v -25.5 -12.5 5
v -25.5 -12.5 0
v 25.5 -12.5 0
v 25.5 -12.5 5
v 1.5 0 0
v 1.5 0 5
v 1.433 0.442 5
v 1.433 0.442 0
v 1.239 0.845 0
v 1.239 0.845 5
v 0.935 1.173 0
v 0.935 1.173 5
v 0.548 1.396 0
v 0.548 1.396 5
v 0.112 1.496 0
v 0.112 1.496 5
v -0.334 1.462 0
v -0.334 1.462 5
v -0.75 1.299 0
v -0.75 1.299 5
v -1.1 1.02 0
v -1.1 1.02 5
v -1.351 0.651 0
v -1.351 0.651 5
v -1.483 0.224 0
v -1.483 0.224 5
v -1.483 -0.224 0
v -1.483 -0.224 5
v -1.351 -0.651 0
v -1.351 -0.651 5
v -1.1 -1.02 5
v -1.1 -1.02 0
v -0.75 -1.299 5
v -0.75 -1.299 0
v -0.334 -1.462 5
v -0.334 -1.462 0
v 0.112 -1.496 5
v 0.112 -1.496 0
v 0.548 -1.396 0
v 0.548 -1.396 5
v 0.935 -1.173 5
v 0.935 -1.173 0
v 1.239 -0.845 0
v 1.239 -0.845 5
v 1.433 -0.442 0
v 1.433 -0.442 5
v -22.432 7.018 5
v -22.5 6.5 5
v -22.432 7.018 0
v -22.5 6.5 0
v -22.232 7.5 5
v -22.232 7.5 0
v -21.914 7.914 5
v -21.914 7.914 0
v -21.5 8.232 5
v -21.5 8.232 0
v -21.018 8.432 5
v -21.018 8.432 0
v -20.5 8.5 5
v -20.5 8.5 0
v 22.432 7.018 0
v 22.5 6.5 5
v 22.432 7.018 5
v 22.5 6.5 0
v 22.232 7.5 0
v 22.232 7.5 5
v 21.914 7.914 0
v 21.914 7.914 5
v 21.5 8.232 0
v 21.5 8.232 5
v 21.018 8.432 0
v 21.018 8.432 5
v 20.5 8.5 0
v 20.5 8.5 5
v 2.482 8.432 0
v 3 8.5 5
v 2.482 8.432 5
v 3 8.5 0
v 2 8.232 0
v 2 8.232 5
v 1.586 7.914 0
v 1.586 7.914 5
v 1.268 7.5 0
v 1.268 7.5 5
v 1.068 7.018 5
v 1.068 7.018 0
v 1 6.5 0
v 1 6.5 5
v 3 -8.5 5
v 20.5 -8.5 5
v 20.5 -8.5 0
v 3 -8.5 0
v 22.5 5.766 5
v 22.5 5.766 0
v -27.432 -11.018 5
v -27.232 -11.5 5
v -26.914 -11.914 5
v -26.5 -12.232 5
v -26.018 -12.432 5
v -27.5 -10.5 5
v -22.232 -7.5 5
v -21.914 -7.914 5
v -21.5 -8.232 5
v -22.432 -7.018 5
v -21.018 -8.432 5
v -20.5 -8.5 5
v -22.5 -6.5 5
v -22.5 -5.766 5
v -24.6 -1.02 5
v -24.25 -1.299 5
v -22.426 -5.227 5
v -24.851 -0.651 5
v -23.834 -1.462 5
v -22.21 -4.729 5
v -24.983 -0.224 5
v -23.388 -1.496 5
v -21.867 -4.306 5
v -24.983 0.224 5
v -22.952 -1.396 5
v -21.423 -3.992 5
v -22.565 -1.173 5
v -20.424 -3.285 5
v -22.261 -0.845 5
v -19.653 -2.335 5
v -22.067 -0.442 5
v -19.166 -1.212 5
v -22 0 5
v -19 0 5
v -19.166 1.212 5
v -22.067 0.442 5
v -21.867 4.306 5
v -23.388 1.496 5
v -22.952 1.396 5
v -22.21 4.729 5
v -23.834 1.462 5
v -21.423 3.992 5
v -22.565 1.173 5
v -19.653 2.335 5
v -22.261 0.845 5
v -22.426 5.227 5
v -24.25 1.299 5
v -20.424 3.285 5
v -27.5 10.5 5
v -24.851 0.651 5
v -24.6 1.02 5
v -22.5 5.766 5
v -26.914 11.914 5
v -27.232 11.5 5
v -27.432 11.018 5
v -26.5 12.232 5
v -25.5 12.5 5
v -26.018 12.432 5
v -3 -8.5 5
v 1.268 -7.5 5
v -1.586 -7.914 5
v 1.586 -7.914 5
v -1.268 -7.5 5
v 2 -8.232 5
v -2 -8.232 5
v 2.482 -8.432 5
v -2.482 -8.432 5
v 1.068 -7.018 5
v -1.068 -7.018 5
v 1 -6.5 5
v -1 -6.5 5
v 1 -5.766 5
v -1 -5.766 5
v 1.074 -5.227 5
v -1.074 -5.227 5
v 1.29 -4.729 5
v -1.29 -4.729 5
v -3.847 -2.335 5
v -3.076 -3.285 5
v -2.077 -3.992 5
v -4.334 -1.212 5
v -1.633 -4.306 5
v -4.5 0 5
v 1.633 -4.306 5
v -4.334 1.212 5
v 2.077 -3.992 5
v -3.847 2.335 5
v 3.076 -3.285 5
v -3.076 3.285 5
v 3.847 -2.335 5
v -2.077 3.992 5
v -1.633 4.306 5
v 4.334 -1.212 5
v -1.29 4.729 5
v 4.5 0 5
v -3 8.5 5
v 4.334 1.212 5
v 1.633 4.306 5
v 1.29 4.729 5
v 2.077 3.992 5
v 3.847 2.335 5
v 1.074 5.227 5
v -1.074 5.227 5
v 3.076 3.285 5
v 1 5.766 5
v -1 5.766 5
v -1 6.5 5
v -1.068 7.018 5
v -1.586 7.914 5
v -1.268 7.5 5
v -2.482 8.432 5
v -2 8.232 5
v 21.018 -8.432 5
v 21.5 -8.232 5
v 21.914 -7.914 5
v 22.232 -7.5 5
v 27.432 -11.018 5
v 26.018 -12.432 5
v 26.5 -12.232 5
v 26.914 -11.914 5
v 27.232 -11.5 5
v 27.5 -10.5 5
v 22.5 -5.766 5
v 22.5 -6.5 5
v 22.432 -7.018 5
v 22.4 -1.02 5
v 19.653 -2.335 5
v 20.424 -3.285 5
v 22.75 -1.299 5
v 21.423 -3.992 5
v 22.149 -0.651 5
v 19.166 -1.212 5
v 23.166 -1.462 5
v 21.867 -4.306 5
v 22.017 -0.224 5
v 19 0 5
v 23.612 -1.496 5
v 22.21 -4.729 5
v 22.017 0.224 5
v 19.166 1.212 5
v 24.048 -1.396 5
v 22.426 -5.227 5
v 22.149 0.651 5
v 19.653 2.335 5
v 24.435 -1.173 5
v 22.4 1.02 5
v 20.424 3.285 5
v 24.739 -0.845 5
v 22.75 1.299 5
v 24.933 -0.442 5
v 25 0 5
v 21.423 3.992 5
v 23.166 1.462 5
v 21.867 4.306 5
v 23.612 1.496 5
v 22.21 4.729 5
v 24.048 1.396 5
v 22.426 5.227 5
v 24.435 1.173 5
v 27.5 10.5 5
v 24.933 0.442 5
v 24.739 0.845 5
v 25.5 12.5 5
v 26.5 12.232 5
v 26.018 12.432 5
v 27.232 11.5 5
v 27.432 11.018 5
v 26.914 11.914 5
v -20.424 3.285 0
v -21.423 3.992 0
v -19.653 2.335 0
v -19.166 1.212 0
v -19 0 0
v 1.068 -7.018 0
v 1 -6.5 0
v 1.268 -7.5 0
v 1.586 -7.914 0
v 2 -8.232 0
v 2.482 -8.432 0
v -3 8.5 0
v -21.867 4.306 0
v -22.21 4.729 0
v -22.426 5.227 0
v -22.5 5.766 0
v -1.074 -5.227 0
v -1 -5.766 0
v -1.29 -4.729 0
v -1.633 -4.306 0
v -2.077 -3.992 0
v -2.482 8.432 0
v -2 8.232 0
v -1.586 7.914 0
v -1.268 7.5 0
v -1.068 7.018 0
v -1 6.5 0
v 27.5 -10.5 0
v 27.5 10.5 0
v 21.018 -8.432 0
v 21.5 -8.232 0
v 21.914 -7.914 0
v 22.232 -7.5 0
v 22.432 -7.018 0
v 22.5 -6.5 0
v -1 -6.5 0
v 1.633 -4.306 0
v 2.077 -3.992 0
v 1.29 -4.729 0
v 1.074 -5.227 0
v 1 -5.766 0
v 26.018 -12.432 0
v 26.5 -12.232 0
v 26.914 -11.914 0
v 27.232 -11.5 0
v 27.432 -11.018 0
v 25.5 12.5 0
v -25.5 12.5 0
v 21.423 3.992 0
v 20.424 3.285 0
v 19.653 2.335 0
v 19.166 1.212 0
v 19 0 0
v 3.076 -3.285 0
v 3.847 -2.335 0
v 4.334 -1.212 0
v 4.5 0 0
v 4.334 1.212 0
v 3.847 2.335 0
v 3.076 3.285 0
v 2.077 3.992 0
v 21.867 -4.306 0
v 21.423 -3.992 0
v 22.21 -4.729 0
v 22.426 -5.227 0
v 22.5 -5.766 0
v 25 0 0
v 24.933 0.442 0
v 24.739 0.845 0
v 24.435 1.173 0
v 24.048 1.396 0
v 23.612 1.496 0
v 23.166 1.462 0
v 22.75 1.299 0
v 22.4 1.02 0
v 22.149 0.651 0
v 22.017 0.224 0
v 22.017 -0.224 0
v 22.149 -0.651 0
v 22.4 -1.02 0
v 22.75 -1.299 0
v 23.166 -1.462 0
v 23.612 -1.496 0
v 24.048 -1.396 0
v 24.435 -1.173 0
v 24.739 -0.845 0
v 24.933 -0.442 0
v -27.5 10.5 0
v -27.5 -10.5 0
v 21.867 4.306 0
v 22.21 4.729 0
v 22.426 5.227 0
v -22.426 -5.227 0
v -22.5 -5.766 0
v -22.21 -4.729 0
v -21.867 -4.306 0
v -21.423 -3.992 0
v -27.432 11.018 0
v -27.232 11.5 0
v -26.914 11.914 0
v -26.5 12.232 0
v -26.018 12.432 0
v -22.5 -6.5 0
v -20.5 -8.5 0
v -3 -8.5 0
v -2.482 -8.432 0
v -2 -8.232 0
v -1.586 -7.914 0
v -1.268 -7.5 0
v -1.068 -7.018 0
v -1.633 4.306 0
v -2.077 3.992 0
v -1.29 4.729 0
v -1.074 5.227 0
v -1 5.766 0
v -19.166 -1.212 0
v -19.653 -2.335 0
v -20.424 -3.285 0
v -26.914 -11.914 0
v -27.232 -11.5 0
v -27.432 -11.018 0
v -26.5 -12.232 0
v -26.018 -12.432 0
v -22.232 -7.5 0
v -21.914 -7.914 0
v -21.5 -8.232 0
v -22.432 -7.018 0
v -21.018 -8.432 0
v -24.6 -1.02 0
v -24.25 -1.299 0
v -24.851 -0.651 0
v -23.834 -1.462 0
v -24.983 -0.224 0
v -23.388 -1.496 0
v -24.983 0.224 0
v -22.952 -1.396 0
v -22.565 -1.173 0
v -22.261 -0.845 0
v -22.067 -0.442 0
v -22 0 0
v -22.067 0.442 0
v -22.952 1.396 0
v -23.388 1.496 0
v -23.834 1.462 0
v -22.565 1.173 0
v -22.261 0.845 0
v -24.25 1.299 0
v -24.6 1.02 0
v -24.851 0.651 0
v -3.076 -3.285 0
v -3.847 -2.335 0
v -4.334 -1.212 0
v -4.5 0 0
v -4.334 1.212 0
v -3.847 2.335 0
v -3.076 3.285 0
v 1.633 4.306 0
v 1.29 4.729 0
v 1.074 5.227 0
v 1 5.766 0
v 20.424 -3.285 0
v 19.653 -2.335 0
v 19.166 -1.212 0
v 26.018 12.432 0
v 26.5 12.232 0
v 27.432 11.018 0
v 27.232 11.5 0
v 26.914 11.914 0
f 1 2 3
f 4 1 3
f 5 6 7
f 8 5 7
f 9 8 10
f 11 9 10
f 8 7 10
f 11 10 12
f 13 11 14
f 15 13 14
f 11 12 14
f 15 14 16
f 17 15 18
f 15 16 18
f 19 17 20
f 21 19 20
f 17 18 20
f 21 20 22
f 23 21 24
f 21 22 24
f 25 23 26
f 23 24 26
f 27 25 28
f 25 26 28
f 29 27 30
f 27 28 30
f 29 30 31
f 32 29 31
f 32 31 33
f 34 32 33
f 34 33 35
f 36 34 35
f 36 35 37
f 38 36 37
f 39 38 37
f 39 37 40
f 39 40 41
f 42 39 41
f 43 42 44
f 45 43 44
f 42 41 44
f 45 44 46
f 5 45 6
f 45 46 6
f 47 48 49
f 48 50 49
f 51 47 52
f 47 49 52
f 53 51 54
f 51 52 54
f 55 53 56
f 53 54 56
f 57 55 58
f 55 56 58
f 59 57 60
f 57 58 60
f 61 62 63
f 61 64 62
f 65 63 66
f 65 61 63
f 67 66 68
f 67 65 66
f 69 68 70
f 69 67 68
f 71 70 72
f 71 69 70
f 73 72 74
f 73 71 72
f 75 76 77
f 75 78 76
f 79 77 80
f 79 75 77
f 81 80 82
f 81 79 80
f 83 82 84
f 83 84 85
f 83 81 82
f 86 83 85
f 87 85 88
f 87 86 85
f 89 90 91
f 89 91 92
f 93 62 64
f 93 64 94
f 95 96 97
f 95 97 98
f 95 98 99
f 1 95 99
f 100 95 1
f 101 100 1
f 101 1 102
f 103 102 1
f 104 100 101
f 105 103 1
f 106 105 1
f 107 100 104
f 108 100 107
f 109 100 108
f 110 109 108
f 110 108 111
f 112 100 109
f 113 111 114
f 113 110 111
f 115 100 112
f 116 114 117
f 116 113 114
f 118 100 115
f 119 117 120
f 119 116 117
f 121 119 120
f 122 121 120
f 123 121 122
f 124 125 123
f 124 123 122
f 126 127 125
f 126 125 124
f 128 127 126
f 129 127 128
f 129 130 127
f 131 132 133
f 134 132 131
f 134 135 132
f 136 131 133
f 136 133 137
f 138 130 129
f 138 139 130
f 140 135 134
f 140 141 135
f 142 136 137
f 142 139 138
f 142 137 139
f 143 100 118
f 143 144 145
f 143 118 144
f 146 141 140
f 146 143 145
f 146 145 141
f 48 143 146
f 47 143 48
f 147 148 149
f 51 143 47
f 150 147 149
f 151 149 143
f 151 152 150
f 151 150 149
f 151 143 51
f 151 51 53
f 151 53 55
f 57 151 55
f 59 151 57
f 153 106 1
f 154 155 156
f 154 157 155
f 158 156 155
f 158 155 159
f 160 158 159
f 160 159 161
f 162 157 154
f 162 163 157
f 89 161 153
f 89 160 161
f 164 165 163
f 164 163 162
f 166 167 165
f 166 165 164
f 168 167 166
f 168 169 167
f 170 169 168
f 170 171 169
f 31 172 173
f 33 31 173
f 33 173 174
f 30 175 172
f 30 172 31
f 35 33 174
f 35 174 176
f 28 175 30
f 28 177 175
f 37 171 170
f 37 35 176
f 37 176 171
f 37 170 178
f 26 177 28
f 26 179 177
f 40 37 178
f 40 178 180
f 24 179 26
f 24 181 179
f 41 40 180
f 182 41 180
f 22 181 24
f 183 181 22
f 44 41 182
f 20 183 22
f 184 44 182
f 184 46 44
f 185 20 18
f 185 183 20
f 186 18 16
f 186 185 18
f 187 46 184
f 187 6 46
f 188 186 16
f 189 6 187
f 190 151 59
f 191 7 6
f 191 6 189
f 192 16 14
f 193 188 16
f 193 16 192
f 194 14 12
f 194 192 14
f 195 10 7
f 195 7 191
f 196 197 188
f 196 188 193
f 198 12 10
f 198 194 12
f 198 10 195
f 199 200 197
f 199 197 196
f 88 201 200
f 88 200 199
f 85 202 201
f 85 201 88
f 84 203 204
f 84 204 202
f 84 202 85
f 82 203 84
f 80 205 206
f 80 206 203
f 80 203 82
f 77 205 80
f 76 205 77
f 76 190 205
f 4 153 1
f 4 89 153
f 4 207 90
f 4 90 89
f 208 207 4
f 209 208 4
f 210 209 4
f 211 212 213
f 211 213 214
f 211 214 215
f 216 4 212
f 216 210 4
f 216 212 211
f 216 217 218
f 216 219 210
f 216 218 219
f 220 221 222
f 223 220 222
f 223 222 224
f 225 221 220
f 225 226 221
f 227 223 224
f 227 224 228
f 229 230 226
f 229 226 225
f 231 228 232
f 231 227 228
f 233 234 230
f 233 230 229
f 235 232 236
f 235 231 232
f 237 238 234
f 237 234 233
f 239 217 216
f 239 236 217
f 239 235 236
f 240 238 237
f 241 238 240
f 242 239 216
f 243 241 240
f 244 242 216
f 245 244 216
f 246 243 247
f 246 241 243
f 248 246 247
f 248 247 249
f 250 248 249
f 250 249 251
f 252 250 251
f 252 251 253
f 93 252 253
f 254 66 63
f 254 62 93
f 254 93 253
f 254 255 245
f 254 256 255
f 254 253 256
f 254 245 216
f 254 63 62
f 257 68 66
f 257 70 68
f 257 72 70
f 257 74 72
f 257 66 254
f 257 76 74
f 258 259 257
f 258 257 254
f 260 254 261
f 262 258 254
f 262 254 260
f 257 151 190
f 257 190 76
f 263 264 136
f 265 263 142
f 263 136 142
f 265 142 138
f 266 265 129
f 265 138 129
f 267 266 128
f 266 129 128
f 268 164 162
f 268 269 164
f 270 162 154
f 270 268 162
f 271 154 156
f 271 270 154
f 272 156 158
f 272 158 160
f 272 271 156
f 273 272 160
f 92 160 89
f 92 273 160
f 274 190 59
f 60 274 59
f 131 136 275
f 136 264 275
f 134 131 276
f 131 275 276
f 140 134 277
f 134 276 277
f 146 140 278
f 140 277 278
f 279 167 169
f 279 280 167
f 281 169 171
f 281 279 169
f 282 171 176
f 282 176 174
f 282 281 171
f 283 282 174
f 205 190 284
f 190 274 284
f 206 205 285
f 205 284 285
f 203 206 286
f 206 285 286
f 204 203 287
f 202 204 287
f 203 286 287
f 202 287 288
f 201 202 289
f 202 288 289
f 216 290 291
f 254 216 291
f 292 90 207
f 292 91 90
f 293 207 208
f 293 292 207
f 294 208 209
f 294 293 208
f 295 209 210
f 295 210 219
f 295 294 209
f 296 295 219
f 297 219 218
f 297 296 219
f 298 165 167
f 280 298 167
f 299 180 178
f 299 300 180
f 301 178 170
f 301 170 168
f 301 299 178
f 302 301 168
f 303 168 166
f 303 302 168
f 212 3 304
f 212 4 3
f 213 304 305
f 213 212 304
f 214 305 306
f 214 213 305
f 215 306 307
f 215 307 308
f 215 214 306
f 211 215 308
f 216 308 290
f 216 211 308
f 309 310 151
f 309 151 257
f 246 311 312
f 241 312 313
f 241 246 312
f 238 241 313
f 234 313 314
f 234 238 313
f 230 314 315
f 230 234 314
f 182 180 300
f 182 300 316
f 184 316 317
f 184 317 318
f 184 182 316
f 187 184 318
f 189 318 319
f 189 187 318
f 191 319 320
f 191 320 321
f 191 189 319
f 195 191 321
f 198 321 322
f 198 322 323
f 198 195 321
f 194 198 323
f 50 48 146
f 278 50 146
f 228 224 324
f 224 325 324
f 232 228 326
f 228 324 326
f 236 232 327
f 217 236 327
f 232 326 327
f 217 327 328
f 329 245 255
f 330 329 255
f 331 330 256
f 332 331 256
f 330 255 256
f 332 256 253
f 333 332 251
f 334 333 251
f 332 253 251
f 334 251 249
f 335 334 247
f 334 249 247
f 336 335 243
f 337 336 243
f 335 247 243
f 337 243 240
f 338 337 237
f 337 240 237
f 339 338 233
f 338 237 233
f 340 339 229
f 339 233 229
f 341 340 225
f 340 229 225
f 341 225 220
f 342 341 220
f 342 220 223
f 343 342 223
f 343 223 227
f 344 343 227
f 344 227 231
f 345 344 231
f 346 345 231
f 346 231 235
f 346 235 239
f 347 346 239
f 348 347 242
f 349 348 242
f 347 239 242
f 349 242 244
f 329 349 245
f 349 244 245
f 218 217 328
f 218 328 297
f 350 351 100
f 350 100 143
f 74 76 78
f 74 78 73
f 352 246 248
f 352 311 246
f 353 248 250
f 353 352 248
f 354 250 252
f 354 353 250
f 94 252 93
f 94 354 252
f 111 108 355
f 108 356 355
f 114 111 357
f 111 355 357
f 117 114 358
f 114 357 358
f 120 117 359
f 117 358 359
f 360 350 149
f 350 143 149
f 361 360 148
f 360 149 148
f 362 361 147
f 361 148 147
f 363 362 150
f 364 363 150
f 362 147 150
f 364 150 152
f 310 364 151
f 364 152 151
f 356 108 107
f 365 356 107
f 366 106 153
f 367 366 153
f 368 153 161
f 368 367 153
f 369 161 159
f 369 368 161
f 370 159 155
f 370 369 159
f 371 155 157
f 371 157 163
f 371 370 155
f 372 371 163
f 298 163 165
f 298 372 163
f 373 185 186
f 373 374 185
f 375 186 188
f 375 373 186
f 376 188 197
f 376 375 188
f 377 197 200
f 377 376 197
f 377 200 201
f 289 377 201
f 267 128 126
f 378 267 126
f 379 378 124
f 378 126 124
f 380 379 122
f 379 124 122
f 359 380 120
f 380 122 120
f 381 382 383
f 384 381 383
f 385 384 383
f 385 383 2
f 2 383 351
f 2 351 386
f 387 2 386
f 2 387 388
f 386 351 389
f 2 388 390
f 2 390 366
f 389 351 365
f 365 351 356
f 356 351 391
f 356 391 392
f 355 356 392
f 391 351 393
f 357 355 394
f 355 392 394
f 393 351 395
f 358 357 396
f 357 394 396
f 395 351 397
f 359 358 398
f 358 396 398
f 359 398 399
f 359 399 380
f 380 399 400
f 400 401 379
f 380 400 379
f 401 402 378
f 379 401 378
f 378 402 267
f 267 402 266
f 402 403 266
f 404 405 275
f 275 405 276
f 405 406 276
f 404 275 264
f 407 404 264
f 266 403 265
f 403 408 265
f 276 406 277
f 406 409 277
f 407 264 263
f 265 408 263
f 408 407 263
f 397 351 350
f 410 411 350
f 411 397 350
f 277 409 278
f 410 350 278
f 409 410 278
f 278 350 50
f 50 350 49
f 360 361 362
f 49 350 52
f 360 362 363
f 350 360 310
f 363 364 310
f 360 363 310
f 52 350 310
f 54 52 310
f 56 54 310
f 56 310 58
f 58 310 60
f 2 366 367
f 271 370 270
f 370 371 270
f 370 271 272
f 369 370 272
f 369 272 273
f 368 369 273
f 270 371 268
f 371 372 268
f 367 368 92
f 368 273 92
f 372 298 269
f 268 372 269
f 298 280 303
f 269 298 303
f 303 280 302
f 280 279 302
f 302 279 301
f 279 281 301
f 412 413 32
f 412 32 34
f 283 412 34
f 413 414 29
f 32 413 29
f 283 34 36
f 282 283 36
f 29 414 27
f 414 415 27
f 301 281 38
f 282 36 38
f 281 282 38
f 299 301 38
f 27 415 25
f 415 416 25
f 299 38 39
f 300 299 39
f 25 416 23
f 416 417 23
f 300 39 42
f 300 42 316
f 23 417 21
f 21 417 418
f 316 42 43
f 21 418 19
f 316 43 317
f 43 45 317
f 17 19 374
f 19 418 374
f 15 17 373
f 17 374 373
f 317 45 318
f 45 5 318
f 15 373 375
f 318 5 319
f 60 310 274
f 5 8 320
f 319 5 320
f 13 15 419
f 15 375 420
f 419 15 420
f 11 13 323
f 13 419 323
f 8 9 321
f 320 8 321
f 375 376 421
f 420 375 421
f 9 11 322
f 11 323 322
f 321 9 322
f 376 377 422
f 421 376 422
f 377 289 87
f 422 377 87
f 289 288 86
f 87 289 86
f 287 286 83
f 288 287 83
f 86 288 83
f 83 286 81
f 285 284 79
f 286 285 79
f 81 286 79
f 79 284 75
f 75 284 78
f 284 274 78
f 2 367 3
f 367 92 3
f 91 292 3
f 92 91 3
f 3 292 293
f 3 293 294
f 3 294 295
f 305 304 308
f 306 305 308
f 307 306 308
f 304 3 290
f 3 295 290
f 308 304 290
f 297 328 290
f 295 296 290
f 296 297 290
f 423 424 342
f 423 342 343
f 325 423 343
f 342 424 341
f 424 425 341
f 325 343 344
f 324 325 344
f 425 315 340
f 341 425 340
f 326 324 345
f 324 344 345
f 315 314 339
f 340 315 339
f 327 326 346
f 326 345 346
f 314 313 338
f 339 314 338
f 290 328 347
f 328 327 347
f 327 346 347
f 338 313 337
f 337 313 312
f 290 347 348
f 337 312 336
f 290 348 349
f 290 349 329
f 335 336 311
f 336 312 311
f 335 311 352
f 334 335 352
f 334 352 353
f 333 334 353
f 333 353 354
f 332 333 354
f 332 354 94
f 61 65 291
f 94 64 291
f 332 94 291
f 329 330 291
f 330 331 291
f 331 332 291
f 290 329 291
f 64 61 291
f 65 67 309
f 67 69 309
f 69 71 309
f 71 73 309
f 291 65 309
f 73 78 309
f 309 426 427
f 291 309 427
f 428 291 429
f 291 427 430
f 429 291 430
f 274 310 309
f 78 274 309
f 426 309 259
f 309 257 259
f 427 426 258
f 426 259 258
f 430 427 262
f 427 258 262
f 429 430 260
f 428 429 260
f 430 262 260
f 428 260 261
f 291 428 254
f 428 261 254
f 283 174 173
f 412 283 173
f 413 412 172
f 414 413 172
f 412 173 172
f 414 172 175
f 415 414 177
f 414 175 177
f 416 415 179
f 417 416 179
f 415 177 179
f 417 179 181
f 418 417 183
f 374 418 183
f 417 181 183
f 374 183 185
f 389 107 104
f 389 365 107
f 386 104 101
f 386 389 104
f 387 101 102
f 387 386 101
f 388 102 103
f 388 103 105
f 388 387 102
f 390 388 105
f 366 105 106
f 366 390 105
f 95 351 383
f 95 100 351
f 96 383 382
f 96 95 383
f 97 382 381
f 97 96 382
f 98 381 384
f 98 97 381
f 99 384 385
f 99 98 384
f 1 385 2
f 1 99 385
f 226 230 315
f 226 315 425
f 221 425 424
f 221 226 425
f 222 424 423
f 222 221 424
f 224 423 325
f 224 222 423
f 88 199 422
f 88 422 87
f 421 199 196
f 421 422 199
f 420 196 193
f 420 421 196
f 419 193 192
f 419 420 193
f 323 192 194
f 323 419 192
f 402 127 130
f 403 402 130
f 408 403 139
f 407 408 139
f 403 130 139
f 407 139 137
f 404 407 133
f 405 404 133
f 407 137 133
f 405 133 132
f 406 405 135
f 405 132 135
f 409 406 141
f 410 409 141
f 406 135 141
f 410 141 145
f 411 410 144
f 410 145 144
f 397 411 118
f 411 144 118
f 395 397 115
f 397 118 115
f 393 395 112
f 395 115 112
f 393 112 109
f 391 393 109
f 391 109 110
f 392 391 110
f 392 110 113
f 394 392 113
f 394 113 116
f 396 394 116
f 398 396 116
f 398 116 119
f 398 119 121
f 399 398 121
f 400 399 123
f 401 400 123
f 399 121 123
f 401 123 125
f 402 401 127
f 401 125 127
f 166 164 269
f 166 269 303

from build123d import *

# Parameters (mm, degrees)
SKETCH_1_W          = 55
SKETCH_1_H          = 25
EXTRUDE_1_DEPTH     = 5
SKETCH_2_R          = 1.5
CUT_EXTRUDE_1_DEPTH = 5
CUT_EXTRUDE_2_DEPTH = 5
FILLET_1_R          = 2
FILLET_2_R          = 2


with BuildPart() as part:
    # 草图1 → 凸台-拉伸1 (new body)
    with BuildSketch(Plane.XY):
        Rectangle(SKETCH_1_W, SKETCH_1_H)
    extrude(amount=EXTRUDE_1_DEPTH)

    # 草图2 → 切除-拉伸1 (cut)
    with BuildSketch(Plane.XY.offset(5)):
        with Locations((-23.5, 0)):
            Circle(SKETCH_2_R)
        Circle(SKETCH_2_R)
        with Locations((23.5, 0)):
            Circle(SKETCH_2_R)
    extrude(amount=-CUT_EXTRUDE_1_DEPTH, mode=Mode.SUBTRACT)

    # 草图3 → 切除-拉伸2 (cut)
    with BuildSketch(Plane.XY.offset(5)):
        with BuildLine():
            Line((-22.5, -4.387482194), (-22.5, -8.5))
            Line((-22.5, -8.5), (-1, -8.5))
            Line((-1, -8.5), (-1, -4.387482194))
            ThreePointArc((-1, -4.387482194), (-4.5, 0), (-1, 4.387482194))
            Line((-1, 4.387482194), (-1, 8.5))
            Line((-1, 8.5), (-22.5, 8.5))
            Line((-22.5, 8.5), (-22.5, 4.387482194))
            ThreePointArc((-22.5, 4.387482194), (-19.98218818, 2.80624304), (-19, 0))
            ThreePointArc((-19, 0), (-19.98218818, -2.80624304), (-22.5, -4.387482194))
        make_face()
    cut_extrude_2 = extrude(amount=-CUT_EXTRUDE_2_DEPTH, mode=Mode.SUBTRACT)

    # 镜向2: 切除-拉伸2 across plane
    add(cut_extrude_2.mirror(Plane(origin=(0, 0, 0), x_dir=(0, 0, 1), z_dir=(1, 0, 0))), mode=Mode.SUBTRACT)

    # 圆角1
    fillet_1_edges = [part.edges().sort_by_distance(p)[0] for p in [
        (-1, 4.387482194, 2.5),
        (-1, -4.387482194, 2.5),
        (-1, -8.5, 2.5),
        (-22.5, -8.5, 2.5),
        (-22.5, -4.387482194, 2.5),
        (-22.5, 4.387482194, 2.5),
        (-22.5, 8.5, 2.5),
        (-1, 8.5, 2.5),
        (1, -4.387482194, 2.5),
        (1, 4.387482194, 2.5),
        (1, 8.5, 2.5),
        (22.5, 8.5, 2.5),
        (22.5, 4.387482194, 2.5),
        (22.5, -4.387482194, 2.5),
        (22.5, -8.5, 2.5),
        (1, -8.5, 2.5),
    ]]
    fillet(fillet_1_edges, radius=FILLET_1_R)

    # 圆角2
    fillet_2_edges = [part.edges().sort_by_distance(p)[0] for p in [
        (27.5, -12.5, 2.5),
        (-27.5, -12.5, 2.5),
        (-27.5, 12.5, 2.5),
        (27.5, 12.5, 2.5),
    ]]
    fillet(fillet_2_edges, radius=FILLET_2_R)


solid = part.part
